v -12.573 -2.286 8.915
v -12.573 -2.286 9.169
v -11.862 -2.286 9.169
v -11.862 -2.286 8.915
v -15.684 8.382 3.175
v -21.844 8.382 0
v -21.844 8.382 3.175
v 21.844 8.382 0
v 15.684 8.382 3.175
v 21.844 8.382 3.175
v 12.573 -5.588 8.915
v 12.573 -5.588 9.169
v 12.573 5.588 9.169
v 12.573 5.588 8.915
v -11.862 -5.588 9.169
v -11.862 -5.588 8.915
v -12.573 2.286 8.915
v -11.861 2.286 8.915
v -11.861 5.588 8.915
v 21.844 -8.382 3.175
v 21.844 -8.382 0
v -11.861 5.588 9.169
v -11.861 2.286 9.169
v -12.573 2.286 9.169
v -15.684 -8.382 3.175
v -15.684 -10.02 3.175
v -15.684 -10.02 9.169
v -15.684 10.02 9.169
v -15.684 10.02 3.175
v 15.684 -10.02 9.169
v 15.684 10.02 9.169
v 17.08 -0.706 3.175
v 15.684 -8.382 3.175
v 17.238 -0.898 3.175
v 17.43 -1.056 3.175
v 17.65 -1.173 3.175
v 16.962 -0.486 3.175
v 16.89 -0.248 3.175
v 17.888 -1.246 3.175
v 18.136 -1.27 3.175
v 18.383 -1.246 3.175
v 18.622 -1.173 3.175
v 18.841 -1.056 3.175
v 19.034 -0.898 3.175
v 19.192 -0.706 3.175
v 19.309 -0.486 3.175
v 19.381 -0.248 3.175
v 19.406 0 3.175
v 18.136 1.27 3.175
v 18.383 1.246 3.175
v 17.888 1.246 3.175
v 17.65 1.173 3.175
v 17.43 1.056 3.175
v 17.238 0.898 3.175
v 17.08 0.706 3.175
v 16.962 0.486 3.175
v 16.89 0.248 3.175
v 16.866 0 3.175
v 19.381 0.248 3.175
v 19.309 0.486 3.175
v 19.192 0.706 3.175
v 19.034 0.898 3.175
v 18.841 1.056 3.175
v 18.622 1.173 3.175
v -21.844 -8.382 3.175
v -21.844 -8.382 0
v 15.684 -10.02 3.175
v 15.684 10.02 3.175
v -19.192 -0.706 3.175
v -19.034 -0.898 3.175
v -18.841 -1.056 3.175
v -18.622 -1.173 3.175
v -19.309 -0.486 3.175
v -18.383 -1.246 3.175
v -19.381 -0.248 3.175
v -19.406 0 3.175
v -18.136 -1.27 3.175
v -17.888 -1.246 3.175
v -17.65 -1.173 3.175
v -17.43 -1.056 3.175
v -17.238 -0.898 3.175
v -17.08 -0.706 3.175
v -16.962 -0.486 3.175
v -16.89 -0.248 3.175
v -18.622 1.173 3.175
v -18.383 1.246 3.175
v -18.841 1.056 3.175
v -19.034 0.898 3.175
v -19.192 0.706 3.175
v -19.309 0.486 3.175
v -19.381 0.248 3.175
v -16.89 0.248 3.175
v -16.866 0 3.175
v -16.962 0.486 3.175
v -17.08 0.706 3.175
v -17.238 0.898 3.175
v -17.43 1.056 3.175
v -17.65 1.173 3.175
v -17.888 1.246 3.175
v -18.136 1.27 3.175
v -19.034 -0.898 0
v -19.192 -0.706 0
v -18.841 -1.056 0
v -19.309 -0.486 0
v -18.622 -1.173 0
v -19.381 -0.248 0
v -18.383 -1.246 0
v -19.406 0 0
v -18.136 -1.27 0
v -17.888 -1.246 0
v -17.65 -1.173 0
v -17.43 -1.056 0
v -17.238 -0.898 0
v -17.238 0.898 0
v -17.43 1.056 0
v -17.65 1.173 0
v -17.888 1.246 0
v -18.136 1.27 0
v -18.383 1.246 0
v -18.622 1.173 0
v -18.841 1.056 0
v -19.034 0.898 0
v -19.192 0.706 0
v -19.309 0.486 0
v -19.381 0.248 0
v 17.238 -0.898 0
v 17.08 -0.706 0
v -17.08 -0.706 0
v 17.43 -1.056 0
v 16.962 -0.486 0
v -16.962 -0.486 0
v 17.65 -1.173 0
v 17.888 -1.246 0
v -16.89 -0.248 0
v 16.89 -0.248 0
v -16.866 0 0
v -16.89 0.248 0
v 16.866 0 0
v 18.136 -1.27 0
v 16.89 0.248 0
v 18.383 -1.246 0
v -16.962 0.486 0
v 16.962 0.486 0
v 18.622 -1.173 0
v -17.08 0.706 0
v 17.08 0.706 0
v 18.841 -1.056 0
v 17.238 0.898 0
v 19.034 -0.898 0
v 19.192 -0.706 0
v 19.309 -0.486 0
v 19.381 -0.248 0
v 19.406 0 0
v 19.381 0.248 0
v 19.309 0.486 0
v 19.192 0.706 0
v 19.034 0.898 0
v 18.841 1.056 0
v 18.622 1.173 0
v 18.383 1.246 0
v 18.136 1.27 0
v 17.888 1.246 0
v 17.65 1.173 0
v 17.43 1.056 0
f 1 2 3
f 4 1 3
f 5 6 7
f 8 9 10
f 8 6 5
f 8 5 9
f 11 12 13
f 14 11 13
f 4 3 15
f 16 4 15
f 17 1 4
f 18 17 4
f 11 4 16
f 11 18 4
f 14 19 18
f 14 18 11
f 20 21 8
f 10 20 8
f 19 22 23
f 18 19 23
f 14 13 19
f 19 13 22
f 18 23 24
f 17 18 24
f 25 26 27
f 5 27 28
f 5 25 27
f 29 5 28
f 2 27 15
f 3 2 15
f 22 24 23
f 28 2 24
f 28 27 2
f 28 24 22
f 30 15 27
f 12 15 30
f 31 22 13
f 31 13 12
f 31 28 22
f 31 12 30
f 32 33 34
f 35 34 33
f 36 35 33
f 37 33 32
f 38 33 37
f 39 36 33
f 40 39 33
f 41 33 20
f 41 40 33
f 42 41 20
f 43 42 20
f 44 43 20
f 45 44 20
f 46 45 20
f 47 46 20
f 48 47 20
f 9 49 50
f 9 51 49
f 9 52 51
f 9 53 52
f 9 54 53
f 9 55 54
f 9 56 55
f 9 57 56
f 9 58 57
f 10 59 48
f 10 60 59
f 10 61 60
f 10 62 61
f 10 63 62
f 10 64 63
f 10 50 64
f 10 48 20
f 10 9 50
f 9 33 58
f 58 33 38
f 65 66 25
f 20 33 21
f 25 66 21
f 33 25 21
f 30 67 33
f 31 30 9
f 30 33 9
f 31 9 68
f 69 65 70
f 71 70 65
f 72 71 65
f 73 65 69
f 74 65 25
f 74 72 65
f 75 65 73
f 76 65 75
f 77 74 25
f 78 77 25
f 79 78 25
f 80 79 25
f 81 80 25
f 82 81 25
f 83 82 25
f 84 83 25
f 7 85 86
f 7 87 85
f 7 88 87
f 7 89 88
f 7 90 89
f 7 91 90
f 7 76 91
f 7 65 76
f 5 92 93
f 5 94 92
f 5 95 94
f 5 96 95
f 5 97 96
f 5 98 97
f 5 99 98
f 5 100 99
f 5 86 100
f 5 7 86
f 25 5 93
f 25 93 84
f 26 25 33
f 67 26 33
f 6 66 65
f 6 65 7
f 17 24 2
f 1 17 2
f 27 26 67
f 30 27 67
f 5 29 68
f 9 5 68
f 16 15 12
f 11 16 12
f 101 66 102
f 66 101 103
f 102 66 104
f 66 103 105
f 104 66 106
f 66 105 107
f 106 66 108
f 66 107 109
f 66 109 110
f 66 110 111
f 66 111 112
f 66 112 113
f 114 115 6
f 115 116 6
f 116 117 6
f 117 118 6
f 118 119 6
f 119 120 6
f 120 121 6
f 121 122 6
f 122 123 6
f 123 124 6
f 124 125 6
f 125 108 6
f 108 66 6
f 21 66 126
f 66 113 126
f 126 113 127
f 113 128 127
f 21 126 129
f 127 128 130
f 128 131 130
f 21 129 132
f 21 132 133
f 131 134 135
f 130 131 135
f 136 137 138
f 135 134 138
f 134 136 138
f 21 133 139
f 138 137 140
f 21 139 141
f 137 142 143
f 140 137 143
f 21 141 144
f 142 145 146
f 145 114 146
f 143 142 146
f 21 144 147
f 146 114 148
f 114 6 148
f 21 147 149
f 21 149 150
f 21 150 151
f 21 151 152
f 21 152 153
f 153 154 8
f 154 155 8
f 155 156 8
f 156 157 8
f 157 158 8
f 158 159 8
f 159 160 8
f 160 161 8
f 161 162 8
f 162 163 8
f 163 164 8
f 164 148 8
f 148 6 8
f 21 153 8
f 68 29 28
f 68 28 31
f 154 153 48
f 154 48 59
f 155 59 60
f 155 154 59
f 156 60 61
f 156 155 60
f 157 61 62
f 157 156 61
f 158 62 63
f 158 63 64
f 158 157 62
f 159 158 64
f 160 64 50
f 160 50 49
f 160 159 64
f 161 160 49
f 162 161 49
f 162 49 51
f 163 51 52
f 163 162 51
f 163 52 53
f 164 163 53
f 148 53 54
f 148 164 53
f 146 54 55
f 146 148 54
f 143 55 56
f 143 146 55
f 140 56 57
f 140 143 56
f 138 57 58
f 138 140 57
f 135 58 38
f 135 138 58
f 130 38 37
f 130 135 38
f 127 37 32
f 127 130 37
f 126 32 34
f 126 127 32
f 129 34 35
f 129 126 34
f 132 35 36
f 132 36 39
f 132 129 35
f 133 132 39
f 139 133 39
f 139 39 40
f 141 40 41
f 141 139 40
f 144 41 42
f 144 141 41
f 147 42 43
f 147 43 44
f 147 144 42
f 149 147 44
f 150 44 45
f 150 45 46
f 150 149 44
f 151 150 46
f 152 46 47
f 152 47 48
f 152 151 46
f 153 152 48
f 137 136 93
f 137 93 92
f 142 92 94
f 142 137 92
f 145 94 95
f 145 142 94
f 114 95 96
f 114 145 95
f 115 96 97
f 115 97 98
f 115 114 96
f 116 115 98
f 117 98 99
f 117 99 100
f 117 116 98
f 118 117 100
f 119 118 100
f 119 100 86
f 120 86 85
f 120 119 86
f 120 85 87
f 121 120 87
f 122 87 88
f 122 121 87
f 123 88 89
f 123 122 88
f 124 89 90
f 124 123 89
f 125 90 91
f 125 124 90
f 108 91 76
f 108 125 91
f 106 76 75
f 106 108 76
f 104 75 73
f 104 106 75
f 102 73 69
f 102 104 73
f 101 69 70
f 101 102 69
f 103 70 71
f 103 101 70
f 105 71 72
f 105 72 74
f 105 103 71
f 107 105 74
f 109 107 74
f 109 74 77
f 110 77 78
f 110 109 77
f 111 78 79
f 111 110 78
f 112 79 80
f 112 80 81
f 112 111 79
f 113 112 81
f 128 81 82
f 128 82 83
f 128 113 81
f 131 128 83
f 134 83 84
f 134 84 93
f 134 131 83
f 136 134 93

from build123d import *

# Parameters (mm, degrees)
F0_W     = 43.688
F0_H     = 16.764
F0_R     = 1.27
F1_DEPTH = 3.175
F2_W     = 31.369
F2_H     = 20.0406
F3_DEPTH = 5.9944
F5_DEPTH = 0.254


with BuildPart() as f1:
    # F0 (on Top) → F1 (new body)
    with BuildSketch(Plane.XY):
        Rectangle(F0_W, F0_H)
        with Locations((-18.1356, 0)):
            Circle(F0_R, mode=Mode.SUBTRACT)
        with Locations((18.1356, 0)):
            Circle(F0_R, mode=Mode.SUBTRACT)
    extrude(amount=F1_DEPTH)

    # F2 (on face) → F3 (join)
    with BuildSketch(Plane.XY.offset(3.175)):
        Rectangle(F2_W, F2_H)
    extrude(amount=F3_DEPTH)

    # F4 (on face) → F5 (cut)
    with BuildSketch(Plane.XY.offset(9.1694)):
        Polygon((-11.8618, -5.588), (12.573, -5.588), (12.573, 5.588), (-11.861305, 5.588), (-11.861305, 2.286189), (-12.573, 2.286189), (-12.573, -2.286), (-11.8618, -2.286), align=None)
    extrude(amount=-F5_DEPTH, mode=Mode.SUBTRACT)


solid = f1.part
